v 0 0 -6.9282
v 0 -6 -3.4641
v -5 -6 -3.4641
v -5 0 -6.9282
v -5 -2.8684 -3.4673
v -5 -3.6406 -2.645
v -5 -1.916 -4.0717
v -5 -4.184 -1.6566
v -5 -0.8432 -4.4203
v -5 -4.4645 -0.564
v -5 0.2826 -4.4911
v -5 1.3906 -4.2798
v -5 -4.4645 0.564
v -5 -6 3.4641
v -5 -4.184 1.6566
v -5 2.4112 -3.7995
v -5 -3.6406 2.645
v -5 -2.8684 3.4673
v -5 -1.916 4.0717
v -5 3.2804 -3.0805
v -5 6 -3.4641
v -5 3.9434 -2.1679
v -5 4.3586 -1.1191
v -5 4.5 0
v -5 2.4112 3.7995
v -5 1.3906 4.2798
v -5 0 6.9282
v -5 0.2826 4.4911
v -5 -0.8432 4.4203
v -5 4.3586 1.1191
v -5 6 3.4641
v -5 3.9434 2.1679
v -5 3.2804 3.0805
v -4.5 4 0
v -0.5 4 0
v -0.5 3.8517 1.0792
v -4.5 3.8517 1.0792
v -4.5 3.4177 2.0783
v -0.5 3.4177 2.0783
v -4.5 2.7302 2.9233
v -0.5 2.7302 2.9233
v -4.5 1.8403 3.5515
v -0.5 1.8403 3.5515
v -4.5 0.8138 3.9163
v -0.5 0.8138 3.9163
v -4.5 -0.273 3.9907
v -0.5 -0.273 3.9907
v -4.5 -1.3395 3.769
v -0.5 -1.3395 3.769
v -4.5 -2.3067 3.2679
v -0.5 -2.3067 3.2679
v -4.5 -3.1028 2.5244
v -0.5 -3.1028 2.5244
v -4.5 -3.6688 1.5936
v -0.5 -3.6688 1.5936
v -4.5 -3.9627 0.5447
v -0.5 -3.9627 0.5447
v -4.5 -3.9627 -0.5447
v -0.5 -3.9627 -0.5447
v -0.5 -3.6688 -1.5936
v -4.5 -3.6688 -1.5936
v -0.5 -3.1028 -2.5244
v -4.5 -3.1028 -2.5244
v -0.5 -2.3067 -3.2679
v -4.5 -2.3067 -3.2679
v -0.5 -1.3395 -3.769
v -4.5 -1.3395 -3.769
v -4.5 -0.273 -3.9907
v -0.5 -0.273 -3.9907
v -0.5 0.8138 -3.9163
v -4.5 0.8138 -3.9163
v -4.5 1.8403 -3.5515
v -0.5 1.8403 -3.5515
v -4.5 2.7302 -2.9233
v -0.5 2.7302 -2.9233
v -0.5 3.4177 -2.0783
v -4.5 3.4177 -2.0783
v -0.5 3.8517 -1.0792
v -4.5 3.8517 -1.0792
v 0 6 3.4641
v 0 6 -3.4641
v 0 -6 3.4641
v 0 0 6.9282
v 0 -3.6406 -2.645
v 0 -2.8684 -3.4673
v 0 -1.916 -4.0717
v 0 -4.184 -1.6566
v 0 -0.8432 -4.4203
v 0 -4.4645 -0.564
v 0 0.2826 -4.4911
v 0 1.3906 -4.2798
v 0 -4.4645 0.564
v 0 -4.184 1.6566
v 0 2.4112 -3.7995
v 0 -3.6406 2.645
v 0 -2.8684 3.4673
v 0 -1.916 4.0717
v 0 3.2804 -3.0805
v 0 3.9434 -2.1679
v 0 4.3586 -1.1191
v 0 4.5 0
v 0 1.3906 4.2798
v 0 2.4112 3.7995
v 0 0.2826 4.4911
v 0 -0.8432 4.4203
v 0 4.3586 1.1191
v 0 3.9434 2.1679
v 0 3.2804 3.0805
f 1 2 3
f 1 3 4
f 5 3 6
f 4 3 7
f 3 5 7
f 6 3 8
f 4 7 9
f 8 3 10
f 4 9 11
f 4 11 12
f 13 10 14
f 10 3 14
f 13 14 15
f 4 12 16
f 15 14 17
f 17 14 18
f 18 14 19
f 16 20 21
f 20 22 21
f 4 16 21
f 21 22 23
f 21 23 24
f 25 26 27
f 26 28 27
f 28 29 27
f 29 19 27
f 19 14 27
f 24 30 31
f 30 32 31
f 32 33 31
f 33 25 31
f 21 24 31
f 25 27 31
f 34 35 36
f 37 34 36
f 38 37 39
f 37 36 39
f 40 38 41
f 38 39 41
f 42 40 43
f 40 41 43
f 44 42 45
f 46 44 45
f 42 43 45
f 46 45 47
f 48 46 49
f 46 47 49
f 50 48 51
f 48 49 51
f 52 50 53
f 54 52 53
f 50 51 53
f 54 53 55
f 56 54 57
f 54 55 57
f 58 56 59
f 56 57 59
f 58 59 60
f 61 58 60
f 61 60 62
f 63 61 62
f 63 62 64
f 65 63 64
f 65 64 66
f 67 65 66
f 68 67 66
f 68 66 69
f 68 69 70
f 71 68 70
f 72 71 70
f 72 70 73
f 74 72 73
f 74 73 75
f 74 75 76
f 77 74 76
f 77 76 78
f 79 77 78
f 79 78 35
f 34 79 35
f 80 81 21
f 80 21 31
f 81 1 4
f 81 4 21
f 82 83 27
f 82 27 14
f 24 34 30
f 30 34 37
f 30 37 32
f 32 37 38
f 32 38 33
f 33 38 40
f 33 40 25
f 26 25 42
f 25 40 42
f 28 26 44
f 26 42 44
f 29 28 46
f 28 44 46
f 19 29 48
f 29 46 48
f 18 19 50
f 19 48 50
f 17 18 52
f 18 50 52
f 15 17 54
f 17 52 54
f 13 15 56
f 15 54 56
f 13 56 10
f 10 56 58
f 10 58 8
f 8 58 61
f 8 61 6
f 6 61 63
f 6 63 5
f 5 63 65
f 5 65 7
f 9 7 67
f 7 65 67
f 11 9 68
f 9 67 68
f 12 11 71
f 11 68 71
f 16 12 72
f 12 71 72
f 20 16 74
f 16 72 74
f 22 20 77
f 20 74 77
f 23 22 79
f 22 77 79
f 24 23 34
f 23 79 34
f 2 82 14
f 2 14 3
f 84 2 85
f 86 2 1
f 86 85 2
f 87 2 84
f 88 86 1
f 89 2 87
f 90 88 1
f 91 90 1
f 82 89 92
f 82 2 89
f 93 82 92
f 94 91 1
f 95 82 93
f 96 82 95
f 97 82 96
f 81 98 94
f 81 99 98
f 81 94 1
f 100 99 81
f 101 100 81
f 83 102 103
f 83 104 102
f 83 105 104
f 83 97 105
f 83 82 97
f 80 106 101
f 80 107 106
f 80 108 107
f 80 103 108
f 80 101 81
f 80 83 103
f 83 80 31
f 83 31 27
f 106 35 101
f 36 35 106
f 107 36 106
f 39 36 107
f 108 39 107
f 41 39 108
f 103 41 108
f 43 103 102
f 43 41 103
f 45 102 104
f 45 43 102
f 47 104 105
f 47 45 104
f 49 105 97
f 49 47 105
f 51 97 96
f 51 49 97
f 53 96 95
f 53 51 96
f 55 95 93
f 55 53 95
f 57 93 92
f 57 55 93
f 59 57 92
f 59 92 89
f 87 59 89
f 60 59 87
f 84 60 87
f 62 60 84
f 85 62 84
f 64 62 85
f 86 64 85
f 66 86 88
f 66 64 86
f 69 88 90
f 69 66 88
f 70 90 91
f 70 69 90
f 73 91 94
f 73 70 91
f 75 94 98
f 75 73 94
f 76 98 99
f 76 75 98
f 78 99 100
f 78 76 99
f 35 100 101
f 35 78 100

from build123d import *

# Parameters (mm, degrees)
F1_DEPTH = 5
F2_R     = 4
F3_DEPTH = 5.001
F4_SIZE  = 0.5


with BuildPart() as f1:
    # F0 (on Right) → F1 (new body)
    with BuildSketch(Plane.YZ):
        Polygon((0, -6.928203), (6, -3.464102), (6, 3.464102), (0, 6.928203), (-6, 3.464102), (-6, -3.464102), align=None)
    extrude(amount=-F1_DEPTH)

    # F2 (on face) → F3 (cut, through all)
    with BuildSketch(Plane.YZ):
        Circle(F2_R)
    extrude(amount=-F3_DEPTH, mode=Mode.SUBTRACT)

    # F4
    f4_edges = [f1.edges().sort_by_distance(p)[0] for p in [
        (0, -4, 0),
        (-2.5, 4, 0),
        (-5, -4, 0),
    ]]
    chamfer(f4_edges, length=F4_SIZE)


solid = f1.part
